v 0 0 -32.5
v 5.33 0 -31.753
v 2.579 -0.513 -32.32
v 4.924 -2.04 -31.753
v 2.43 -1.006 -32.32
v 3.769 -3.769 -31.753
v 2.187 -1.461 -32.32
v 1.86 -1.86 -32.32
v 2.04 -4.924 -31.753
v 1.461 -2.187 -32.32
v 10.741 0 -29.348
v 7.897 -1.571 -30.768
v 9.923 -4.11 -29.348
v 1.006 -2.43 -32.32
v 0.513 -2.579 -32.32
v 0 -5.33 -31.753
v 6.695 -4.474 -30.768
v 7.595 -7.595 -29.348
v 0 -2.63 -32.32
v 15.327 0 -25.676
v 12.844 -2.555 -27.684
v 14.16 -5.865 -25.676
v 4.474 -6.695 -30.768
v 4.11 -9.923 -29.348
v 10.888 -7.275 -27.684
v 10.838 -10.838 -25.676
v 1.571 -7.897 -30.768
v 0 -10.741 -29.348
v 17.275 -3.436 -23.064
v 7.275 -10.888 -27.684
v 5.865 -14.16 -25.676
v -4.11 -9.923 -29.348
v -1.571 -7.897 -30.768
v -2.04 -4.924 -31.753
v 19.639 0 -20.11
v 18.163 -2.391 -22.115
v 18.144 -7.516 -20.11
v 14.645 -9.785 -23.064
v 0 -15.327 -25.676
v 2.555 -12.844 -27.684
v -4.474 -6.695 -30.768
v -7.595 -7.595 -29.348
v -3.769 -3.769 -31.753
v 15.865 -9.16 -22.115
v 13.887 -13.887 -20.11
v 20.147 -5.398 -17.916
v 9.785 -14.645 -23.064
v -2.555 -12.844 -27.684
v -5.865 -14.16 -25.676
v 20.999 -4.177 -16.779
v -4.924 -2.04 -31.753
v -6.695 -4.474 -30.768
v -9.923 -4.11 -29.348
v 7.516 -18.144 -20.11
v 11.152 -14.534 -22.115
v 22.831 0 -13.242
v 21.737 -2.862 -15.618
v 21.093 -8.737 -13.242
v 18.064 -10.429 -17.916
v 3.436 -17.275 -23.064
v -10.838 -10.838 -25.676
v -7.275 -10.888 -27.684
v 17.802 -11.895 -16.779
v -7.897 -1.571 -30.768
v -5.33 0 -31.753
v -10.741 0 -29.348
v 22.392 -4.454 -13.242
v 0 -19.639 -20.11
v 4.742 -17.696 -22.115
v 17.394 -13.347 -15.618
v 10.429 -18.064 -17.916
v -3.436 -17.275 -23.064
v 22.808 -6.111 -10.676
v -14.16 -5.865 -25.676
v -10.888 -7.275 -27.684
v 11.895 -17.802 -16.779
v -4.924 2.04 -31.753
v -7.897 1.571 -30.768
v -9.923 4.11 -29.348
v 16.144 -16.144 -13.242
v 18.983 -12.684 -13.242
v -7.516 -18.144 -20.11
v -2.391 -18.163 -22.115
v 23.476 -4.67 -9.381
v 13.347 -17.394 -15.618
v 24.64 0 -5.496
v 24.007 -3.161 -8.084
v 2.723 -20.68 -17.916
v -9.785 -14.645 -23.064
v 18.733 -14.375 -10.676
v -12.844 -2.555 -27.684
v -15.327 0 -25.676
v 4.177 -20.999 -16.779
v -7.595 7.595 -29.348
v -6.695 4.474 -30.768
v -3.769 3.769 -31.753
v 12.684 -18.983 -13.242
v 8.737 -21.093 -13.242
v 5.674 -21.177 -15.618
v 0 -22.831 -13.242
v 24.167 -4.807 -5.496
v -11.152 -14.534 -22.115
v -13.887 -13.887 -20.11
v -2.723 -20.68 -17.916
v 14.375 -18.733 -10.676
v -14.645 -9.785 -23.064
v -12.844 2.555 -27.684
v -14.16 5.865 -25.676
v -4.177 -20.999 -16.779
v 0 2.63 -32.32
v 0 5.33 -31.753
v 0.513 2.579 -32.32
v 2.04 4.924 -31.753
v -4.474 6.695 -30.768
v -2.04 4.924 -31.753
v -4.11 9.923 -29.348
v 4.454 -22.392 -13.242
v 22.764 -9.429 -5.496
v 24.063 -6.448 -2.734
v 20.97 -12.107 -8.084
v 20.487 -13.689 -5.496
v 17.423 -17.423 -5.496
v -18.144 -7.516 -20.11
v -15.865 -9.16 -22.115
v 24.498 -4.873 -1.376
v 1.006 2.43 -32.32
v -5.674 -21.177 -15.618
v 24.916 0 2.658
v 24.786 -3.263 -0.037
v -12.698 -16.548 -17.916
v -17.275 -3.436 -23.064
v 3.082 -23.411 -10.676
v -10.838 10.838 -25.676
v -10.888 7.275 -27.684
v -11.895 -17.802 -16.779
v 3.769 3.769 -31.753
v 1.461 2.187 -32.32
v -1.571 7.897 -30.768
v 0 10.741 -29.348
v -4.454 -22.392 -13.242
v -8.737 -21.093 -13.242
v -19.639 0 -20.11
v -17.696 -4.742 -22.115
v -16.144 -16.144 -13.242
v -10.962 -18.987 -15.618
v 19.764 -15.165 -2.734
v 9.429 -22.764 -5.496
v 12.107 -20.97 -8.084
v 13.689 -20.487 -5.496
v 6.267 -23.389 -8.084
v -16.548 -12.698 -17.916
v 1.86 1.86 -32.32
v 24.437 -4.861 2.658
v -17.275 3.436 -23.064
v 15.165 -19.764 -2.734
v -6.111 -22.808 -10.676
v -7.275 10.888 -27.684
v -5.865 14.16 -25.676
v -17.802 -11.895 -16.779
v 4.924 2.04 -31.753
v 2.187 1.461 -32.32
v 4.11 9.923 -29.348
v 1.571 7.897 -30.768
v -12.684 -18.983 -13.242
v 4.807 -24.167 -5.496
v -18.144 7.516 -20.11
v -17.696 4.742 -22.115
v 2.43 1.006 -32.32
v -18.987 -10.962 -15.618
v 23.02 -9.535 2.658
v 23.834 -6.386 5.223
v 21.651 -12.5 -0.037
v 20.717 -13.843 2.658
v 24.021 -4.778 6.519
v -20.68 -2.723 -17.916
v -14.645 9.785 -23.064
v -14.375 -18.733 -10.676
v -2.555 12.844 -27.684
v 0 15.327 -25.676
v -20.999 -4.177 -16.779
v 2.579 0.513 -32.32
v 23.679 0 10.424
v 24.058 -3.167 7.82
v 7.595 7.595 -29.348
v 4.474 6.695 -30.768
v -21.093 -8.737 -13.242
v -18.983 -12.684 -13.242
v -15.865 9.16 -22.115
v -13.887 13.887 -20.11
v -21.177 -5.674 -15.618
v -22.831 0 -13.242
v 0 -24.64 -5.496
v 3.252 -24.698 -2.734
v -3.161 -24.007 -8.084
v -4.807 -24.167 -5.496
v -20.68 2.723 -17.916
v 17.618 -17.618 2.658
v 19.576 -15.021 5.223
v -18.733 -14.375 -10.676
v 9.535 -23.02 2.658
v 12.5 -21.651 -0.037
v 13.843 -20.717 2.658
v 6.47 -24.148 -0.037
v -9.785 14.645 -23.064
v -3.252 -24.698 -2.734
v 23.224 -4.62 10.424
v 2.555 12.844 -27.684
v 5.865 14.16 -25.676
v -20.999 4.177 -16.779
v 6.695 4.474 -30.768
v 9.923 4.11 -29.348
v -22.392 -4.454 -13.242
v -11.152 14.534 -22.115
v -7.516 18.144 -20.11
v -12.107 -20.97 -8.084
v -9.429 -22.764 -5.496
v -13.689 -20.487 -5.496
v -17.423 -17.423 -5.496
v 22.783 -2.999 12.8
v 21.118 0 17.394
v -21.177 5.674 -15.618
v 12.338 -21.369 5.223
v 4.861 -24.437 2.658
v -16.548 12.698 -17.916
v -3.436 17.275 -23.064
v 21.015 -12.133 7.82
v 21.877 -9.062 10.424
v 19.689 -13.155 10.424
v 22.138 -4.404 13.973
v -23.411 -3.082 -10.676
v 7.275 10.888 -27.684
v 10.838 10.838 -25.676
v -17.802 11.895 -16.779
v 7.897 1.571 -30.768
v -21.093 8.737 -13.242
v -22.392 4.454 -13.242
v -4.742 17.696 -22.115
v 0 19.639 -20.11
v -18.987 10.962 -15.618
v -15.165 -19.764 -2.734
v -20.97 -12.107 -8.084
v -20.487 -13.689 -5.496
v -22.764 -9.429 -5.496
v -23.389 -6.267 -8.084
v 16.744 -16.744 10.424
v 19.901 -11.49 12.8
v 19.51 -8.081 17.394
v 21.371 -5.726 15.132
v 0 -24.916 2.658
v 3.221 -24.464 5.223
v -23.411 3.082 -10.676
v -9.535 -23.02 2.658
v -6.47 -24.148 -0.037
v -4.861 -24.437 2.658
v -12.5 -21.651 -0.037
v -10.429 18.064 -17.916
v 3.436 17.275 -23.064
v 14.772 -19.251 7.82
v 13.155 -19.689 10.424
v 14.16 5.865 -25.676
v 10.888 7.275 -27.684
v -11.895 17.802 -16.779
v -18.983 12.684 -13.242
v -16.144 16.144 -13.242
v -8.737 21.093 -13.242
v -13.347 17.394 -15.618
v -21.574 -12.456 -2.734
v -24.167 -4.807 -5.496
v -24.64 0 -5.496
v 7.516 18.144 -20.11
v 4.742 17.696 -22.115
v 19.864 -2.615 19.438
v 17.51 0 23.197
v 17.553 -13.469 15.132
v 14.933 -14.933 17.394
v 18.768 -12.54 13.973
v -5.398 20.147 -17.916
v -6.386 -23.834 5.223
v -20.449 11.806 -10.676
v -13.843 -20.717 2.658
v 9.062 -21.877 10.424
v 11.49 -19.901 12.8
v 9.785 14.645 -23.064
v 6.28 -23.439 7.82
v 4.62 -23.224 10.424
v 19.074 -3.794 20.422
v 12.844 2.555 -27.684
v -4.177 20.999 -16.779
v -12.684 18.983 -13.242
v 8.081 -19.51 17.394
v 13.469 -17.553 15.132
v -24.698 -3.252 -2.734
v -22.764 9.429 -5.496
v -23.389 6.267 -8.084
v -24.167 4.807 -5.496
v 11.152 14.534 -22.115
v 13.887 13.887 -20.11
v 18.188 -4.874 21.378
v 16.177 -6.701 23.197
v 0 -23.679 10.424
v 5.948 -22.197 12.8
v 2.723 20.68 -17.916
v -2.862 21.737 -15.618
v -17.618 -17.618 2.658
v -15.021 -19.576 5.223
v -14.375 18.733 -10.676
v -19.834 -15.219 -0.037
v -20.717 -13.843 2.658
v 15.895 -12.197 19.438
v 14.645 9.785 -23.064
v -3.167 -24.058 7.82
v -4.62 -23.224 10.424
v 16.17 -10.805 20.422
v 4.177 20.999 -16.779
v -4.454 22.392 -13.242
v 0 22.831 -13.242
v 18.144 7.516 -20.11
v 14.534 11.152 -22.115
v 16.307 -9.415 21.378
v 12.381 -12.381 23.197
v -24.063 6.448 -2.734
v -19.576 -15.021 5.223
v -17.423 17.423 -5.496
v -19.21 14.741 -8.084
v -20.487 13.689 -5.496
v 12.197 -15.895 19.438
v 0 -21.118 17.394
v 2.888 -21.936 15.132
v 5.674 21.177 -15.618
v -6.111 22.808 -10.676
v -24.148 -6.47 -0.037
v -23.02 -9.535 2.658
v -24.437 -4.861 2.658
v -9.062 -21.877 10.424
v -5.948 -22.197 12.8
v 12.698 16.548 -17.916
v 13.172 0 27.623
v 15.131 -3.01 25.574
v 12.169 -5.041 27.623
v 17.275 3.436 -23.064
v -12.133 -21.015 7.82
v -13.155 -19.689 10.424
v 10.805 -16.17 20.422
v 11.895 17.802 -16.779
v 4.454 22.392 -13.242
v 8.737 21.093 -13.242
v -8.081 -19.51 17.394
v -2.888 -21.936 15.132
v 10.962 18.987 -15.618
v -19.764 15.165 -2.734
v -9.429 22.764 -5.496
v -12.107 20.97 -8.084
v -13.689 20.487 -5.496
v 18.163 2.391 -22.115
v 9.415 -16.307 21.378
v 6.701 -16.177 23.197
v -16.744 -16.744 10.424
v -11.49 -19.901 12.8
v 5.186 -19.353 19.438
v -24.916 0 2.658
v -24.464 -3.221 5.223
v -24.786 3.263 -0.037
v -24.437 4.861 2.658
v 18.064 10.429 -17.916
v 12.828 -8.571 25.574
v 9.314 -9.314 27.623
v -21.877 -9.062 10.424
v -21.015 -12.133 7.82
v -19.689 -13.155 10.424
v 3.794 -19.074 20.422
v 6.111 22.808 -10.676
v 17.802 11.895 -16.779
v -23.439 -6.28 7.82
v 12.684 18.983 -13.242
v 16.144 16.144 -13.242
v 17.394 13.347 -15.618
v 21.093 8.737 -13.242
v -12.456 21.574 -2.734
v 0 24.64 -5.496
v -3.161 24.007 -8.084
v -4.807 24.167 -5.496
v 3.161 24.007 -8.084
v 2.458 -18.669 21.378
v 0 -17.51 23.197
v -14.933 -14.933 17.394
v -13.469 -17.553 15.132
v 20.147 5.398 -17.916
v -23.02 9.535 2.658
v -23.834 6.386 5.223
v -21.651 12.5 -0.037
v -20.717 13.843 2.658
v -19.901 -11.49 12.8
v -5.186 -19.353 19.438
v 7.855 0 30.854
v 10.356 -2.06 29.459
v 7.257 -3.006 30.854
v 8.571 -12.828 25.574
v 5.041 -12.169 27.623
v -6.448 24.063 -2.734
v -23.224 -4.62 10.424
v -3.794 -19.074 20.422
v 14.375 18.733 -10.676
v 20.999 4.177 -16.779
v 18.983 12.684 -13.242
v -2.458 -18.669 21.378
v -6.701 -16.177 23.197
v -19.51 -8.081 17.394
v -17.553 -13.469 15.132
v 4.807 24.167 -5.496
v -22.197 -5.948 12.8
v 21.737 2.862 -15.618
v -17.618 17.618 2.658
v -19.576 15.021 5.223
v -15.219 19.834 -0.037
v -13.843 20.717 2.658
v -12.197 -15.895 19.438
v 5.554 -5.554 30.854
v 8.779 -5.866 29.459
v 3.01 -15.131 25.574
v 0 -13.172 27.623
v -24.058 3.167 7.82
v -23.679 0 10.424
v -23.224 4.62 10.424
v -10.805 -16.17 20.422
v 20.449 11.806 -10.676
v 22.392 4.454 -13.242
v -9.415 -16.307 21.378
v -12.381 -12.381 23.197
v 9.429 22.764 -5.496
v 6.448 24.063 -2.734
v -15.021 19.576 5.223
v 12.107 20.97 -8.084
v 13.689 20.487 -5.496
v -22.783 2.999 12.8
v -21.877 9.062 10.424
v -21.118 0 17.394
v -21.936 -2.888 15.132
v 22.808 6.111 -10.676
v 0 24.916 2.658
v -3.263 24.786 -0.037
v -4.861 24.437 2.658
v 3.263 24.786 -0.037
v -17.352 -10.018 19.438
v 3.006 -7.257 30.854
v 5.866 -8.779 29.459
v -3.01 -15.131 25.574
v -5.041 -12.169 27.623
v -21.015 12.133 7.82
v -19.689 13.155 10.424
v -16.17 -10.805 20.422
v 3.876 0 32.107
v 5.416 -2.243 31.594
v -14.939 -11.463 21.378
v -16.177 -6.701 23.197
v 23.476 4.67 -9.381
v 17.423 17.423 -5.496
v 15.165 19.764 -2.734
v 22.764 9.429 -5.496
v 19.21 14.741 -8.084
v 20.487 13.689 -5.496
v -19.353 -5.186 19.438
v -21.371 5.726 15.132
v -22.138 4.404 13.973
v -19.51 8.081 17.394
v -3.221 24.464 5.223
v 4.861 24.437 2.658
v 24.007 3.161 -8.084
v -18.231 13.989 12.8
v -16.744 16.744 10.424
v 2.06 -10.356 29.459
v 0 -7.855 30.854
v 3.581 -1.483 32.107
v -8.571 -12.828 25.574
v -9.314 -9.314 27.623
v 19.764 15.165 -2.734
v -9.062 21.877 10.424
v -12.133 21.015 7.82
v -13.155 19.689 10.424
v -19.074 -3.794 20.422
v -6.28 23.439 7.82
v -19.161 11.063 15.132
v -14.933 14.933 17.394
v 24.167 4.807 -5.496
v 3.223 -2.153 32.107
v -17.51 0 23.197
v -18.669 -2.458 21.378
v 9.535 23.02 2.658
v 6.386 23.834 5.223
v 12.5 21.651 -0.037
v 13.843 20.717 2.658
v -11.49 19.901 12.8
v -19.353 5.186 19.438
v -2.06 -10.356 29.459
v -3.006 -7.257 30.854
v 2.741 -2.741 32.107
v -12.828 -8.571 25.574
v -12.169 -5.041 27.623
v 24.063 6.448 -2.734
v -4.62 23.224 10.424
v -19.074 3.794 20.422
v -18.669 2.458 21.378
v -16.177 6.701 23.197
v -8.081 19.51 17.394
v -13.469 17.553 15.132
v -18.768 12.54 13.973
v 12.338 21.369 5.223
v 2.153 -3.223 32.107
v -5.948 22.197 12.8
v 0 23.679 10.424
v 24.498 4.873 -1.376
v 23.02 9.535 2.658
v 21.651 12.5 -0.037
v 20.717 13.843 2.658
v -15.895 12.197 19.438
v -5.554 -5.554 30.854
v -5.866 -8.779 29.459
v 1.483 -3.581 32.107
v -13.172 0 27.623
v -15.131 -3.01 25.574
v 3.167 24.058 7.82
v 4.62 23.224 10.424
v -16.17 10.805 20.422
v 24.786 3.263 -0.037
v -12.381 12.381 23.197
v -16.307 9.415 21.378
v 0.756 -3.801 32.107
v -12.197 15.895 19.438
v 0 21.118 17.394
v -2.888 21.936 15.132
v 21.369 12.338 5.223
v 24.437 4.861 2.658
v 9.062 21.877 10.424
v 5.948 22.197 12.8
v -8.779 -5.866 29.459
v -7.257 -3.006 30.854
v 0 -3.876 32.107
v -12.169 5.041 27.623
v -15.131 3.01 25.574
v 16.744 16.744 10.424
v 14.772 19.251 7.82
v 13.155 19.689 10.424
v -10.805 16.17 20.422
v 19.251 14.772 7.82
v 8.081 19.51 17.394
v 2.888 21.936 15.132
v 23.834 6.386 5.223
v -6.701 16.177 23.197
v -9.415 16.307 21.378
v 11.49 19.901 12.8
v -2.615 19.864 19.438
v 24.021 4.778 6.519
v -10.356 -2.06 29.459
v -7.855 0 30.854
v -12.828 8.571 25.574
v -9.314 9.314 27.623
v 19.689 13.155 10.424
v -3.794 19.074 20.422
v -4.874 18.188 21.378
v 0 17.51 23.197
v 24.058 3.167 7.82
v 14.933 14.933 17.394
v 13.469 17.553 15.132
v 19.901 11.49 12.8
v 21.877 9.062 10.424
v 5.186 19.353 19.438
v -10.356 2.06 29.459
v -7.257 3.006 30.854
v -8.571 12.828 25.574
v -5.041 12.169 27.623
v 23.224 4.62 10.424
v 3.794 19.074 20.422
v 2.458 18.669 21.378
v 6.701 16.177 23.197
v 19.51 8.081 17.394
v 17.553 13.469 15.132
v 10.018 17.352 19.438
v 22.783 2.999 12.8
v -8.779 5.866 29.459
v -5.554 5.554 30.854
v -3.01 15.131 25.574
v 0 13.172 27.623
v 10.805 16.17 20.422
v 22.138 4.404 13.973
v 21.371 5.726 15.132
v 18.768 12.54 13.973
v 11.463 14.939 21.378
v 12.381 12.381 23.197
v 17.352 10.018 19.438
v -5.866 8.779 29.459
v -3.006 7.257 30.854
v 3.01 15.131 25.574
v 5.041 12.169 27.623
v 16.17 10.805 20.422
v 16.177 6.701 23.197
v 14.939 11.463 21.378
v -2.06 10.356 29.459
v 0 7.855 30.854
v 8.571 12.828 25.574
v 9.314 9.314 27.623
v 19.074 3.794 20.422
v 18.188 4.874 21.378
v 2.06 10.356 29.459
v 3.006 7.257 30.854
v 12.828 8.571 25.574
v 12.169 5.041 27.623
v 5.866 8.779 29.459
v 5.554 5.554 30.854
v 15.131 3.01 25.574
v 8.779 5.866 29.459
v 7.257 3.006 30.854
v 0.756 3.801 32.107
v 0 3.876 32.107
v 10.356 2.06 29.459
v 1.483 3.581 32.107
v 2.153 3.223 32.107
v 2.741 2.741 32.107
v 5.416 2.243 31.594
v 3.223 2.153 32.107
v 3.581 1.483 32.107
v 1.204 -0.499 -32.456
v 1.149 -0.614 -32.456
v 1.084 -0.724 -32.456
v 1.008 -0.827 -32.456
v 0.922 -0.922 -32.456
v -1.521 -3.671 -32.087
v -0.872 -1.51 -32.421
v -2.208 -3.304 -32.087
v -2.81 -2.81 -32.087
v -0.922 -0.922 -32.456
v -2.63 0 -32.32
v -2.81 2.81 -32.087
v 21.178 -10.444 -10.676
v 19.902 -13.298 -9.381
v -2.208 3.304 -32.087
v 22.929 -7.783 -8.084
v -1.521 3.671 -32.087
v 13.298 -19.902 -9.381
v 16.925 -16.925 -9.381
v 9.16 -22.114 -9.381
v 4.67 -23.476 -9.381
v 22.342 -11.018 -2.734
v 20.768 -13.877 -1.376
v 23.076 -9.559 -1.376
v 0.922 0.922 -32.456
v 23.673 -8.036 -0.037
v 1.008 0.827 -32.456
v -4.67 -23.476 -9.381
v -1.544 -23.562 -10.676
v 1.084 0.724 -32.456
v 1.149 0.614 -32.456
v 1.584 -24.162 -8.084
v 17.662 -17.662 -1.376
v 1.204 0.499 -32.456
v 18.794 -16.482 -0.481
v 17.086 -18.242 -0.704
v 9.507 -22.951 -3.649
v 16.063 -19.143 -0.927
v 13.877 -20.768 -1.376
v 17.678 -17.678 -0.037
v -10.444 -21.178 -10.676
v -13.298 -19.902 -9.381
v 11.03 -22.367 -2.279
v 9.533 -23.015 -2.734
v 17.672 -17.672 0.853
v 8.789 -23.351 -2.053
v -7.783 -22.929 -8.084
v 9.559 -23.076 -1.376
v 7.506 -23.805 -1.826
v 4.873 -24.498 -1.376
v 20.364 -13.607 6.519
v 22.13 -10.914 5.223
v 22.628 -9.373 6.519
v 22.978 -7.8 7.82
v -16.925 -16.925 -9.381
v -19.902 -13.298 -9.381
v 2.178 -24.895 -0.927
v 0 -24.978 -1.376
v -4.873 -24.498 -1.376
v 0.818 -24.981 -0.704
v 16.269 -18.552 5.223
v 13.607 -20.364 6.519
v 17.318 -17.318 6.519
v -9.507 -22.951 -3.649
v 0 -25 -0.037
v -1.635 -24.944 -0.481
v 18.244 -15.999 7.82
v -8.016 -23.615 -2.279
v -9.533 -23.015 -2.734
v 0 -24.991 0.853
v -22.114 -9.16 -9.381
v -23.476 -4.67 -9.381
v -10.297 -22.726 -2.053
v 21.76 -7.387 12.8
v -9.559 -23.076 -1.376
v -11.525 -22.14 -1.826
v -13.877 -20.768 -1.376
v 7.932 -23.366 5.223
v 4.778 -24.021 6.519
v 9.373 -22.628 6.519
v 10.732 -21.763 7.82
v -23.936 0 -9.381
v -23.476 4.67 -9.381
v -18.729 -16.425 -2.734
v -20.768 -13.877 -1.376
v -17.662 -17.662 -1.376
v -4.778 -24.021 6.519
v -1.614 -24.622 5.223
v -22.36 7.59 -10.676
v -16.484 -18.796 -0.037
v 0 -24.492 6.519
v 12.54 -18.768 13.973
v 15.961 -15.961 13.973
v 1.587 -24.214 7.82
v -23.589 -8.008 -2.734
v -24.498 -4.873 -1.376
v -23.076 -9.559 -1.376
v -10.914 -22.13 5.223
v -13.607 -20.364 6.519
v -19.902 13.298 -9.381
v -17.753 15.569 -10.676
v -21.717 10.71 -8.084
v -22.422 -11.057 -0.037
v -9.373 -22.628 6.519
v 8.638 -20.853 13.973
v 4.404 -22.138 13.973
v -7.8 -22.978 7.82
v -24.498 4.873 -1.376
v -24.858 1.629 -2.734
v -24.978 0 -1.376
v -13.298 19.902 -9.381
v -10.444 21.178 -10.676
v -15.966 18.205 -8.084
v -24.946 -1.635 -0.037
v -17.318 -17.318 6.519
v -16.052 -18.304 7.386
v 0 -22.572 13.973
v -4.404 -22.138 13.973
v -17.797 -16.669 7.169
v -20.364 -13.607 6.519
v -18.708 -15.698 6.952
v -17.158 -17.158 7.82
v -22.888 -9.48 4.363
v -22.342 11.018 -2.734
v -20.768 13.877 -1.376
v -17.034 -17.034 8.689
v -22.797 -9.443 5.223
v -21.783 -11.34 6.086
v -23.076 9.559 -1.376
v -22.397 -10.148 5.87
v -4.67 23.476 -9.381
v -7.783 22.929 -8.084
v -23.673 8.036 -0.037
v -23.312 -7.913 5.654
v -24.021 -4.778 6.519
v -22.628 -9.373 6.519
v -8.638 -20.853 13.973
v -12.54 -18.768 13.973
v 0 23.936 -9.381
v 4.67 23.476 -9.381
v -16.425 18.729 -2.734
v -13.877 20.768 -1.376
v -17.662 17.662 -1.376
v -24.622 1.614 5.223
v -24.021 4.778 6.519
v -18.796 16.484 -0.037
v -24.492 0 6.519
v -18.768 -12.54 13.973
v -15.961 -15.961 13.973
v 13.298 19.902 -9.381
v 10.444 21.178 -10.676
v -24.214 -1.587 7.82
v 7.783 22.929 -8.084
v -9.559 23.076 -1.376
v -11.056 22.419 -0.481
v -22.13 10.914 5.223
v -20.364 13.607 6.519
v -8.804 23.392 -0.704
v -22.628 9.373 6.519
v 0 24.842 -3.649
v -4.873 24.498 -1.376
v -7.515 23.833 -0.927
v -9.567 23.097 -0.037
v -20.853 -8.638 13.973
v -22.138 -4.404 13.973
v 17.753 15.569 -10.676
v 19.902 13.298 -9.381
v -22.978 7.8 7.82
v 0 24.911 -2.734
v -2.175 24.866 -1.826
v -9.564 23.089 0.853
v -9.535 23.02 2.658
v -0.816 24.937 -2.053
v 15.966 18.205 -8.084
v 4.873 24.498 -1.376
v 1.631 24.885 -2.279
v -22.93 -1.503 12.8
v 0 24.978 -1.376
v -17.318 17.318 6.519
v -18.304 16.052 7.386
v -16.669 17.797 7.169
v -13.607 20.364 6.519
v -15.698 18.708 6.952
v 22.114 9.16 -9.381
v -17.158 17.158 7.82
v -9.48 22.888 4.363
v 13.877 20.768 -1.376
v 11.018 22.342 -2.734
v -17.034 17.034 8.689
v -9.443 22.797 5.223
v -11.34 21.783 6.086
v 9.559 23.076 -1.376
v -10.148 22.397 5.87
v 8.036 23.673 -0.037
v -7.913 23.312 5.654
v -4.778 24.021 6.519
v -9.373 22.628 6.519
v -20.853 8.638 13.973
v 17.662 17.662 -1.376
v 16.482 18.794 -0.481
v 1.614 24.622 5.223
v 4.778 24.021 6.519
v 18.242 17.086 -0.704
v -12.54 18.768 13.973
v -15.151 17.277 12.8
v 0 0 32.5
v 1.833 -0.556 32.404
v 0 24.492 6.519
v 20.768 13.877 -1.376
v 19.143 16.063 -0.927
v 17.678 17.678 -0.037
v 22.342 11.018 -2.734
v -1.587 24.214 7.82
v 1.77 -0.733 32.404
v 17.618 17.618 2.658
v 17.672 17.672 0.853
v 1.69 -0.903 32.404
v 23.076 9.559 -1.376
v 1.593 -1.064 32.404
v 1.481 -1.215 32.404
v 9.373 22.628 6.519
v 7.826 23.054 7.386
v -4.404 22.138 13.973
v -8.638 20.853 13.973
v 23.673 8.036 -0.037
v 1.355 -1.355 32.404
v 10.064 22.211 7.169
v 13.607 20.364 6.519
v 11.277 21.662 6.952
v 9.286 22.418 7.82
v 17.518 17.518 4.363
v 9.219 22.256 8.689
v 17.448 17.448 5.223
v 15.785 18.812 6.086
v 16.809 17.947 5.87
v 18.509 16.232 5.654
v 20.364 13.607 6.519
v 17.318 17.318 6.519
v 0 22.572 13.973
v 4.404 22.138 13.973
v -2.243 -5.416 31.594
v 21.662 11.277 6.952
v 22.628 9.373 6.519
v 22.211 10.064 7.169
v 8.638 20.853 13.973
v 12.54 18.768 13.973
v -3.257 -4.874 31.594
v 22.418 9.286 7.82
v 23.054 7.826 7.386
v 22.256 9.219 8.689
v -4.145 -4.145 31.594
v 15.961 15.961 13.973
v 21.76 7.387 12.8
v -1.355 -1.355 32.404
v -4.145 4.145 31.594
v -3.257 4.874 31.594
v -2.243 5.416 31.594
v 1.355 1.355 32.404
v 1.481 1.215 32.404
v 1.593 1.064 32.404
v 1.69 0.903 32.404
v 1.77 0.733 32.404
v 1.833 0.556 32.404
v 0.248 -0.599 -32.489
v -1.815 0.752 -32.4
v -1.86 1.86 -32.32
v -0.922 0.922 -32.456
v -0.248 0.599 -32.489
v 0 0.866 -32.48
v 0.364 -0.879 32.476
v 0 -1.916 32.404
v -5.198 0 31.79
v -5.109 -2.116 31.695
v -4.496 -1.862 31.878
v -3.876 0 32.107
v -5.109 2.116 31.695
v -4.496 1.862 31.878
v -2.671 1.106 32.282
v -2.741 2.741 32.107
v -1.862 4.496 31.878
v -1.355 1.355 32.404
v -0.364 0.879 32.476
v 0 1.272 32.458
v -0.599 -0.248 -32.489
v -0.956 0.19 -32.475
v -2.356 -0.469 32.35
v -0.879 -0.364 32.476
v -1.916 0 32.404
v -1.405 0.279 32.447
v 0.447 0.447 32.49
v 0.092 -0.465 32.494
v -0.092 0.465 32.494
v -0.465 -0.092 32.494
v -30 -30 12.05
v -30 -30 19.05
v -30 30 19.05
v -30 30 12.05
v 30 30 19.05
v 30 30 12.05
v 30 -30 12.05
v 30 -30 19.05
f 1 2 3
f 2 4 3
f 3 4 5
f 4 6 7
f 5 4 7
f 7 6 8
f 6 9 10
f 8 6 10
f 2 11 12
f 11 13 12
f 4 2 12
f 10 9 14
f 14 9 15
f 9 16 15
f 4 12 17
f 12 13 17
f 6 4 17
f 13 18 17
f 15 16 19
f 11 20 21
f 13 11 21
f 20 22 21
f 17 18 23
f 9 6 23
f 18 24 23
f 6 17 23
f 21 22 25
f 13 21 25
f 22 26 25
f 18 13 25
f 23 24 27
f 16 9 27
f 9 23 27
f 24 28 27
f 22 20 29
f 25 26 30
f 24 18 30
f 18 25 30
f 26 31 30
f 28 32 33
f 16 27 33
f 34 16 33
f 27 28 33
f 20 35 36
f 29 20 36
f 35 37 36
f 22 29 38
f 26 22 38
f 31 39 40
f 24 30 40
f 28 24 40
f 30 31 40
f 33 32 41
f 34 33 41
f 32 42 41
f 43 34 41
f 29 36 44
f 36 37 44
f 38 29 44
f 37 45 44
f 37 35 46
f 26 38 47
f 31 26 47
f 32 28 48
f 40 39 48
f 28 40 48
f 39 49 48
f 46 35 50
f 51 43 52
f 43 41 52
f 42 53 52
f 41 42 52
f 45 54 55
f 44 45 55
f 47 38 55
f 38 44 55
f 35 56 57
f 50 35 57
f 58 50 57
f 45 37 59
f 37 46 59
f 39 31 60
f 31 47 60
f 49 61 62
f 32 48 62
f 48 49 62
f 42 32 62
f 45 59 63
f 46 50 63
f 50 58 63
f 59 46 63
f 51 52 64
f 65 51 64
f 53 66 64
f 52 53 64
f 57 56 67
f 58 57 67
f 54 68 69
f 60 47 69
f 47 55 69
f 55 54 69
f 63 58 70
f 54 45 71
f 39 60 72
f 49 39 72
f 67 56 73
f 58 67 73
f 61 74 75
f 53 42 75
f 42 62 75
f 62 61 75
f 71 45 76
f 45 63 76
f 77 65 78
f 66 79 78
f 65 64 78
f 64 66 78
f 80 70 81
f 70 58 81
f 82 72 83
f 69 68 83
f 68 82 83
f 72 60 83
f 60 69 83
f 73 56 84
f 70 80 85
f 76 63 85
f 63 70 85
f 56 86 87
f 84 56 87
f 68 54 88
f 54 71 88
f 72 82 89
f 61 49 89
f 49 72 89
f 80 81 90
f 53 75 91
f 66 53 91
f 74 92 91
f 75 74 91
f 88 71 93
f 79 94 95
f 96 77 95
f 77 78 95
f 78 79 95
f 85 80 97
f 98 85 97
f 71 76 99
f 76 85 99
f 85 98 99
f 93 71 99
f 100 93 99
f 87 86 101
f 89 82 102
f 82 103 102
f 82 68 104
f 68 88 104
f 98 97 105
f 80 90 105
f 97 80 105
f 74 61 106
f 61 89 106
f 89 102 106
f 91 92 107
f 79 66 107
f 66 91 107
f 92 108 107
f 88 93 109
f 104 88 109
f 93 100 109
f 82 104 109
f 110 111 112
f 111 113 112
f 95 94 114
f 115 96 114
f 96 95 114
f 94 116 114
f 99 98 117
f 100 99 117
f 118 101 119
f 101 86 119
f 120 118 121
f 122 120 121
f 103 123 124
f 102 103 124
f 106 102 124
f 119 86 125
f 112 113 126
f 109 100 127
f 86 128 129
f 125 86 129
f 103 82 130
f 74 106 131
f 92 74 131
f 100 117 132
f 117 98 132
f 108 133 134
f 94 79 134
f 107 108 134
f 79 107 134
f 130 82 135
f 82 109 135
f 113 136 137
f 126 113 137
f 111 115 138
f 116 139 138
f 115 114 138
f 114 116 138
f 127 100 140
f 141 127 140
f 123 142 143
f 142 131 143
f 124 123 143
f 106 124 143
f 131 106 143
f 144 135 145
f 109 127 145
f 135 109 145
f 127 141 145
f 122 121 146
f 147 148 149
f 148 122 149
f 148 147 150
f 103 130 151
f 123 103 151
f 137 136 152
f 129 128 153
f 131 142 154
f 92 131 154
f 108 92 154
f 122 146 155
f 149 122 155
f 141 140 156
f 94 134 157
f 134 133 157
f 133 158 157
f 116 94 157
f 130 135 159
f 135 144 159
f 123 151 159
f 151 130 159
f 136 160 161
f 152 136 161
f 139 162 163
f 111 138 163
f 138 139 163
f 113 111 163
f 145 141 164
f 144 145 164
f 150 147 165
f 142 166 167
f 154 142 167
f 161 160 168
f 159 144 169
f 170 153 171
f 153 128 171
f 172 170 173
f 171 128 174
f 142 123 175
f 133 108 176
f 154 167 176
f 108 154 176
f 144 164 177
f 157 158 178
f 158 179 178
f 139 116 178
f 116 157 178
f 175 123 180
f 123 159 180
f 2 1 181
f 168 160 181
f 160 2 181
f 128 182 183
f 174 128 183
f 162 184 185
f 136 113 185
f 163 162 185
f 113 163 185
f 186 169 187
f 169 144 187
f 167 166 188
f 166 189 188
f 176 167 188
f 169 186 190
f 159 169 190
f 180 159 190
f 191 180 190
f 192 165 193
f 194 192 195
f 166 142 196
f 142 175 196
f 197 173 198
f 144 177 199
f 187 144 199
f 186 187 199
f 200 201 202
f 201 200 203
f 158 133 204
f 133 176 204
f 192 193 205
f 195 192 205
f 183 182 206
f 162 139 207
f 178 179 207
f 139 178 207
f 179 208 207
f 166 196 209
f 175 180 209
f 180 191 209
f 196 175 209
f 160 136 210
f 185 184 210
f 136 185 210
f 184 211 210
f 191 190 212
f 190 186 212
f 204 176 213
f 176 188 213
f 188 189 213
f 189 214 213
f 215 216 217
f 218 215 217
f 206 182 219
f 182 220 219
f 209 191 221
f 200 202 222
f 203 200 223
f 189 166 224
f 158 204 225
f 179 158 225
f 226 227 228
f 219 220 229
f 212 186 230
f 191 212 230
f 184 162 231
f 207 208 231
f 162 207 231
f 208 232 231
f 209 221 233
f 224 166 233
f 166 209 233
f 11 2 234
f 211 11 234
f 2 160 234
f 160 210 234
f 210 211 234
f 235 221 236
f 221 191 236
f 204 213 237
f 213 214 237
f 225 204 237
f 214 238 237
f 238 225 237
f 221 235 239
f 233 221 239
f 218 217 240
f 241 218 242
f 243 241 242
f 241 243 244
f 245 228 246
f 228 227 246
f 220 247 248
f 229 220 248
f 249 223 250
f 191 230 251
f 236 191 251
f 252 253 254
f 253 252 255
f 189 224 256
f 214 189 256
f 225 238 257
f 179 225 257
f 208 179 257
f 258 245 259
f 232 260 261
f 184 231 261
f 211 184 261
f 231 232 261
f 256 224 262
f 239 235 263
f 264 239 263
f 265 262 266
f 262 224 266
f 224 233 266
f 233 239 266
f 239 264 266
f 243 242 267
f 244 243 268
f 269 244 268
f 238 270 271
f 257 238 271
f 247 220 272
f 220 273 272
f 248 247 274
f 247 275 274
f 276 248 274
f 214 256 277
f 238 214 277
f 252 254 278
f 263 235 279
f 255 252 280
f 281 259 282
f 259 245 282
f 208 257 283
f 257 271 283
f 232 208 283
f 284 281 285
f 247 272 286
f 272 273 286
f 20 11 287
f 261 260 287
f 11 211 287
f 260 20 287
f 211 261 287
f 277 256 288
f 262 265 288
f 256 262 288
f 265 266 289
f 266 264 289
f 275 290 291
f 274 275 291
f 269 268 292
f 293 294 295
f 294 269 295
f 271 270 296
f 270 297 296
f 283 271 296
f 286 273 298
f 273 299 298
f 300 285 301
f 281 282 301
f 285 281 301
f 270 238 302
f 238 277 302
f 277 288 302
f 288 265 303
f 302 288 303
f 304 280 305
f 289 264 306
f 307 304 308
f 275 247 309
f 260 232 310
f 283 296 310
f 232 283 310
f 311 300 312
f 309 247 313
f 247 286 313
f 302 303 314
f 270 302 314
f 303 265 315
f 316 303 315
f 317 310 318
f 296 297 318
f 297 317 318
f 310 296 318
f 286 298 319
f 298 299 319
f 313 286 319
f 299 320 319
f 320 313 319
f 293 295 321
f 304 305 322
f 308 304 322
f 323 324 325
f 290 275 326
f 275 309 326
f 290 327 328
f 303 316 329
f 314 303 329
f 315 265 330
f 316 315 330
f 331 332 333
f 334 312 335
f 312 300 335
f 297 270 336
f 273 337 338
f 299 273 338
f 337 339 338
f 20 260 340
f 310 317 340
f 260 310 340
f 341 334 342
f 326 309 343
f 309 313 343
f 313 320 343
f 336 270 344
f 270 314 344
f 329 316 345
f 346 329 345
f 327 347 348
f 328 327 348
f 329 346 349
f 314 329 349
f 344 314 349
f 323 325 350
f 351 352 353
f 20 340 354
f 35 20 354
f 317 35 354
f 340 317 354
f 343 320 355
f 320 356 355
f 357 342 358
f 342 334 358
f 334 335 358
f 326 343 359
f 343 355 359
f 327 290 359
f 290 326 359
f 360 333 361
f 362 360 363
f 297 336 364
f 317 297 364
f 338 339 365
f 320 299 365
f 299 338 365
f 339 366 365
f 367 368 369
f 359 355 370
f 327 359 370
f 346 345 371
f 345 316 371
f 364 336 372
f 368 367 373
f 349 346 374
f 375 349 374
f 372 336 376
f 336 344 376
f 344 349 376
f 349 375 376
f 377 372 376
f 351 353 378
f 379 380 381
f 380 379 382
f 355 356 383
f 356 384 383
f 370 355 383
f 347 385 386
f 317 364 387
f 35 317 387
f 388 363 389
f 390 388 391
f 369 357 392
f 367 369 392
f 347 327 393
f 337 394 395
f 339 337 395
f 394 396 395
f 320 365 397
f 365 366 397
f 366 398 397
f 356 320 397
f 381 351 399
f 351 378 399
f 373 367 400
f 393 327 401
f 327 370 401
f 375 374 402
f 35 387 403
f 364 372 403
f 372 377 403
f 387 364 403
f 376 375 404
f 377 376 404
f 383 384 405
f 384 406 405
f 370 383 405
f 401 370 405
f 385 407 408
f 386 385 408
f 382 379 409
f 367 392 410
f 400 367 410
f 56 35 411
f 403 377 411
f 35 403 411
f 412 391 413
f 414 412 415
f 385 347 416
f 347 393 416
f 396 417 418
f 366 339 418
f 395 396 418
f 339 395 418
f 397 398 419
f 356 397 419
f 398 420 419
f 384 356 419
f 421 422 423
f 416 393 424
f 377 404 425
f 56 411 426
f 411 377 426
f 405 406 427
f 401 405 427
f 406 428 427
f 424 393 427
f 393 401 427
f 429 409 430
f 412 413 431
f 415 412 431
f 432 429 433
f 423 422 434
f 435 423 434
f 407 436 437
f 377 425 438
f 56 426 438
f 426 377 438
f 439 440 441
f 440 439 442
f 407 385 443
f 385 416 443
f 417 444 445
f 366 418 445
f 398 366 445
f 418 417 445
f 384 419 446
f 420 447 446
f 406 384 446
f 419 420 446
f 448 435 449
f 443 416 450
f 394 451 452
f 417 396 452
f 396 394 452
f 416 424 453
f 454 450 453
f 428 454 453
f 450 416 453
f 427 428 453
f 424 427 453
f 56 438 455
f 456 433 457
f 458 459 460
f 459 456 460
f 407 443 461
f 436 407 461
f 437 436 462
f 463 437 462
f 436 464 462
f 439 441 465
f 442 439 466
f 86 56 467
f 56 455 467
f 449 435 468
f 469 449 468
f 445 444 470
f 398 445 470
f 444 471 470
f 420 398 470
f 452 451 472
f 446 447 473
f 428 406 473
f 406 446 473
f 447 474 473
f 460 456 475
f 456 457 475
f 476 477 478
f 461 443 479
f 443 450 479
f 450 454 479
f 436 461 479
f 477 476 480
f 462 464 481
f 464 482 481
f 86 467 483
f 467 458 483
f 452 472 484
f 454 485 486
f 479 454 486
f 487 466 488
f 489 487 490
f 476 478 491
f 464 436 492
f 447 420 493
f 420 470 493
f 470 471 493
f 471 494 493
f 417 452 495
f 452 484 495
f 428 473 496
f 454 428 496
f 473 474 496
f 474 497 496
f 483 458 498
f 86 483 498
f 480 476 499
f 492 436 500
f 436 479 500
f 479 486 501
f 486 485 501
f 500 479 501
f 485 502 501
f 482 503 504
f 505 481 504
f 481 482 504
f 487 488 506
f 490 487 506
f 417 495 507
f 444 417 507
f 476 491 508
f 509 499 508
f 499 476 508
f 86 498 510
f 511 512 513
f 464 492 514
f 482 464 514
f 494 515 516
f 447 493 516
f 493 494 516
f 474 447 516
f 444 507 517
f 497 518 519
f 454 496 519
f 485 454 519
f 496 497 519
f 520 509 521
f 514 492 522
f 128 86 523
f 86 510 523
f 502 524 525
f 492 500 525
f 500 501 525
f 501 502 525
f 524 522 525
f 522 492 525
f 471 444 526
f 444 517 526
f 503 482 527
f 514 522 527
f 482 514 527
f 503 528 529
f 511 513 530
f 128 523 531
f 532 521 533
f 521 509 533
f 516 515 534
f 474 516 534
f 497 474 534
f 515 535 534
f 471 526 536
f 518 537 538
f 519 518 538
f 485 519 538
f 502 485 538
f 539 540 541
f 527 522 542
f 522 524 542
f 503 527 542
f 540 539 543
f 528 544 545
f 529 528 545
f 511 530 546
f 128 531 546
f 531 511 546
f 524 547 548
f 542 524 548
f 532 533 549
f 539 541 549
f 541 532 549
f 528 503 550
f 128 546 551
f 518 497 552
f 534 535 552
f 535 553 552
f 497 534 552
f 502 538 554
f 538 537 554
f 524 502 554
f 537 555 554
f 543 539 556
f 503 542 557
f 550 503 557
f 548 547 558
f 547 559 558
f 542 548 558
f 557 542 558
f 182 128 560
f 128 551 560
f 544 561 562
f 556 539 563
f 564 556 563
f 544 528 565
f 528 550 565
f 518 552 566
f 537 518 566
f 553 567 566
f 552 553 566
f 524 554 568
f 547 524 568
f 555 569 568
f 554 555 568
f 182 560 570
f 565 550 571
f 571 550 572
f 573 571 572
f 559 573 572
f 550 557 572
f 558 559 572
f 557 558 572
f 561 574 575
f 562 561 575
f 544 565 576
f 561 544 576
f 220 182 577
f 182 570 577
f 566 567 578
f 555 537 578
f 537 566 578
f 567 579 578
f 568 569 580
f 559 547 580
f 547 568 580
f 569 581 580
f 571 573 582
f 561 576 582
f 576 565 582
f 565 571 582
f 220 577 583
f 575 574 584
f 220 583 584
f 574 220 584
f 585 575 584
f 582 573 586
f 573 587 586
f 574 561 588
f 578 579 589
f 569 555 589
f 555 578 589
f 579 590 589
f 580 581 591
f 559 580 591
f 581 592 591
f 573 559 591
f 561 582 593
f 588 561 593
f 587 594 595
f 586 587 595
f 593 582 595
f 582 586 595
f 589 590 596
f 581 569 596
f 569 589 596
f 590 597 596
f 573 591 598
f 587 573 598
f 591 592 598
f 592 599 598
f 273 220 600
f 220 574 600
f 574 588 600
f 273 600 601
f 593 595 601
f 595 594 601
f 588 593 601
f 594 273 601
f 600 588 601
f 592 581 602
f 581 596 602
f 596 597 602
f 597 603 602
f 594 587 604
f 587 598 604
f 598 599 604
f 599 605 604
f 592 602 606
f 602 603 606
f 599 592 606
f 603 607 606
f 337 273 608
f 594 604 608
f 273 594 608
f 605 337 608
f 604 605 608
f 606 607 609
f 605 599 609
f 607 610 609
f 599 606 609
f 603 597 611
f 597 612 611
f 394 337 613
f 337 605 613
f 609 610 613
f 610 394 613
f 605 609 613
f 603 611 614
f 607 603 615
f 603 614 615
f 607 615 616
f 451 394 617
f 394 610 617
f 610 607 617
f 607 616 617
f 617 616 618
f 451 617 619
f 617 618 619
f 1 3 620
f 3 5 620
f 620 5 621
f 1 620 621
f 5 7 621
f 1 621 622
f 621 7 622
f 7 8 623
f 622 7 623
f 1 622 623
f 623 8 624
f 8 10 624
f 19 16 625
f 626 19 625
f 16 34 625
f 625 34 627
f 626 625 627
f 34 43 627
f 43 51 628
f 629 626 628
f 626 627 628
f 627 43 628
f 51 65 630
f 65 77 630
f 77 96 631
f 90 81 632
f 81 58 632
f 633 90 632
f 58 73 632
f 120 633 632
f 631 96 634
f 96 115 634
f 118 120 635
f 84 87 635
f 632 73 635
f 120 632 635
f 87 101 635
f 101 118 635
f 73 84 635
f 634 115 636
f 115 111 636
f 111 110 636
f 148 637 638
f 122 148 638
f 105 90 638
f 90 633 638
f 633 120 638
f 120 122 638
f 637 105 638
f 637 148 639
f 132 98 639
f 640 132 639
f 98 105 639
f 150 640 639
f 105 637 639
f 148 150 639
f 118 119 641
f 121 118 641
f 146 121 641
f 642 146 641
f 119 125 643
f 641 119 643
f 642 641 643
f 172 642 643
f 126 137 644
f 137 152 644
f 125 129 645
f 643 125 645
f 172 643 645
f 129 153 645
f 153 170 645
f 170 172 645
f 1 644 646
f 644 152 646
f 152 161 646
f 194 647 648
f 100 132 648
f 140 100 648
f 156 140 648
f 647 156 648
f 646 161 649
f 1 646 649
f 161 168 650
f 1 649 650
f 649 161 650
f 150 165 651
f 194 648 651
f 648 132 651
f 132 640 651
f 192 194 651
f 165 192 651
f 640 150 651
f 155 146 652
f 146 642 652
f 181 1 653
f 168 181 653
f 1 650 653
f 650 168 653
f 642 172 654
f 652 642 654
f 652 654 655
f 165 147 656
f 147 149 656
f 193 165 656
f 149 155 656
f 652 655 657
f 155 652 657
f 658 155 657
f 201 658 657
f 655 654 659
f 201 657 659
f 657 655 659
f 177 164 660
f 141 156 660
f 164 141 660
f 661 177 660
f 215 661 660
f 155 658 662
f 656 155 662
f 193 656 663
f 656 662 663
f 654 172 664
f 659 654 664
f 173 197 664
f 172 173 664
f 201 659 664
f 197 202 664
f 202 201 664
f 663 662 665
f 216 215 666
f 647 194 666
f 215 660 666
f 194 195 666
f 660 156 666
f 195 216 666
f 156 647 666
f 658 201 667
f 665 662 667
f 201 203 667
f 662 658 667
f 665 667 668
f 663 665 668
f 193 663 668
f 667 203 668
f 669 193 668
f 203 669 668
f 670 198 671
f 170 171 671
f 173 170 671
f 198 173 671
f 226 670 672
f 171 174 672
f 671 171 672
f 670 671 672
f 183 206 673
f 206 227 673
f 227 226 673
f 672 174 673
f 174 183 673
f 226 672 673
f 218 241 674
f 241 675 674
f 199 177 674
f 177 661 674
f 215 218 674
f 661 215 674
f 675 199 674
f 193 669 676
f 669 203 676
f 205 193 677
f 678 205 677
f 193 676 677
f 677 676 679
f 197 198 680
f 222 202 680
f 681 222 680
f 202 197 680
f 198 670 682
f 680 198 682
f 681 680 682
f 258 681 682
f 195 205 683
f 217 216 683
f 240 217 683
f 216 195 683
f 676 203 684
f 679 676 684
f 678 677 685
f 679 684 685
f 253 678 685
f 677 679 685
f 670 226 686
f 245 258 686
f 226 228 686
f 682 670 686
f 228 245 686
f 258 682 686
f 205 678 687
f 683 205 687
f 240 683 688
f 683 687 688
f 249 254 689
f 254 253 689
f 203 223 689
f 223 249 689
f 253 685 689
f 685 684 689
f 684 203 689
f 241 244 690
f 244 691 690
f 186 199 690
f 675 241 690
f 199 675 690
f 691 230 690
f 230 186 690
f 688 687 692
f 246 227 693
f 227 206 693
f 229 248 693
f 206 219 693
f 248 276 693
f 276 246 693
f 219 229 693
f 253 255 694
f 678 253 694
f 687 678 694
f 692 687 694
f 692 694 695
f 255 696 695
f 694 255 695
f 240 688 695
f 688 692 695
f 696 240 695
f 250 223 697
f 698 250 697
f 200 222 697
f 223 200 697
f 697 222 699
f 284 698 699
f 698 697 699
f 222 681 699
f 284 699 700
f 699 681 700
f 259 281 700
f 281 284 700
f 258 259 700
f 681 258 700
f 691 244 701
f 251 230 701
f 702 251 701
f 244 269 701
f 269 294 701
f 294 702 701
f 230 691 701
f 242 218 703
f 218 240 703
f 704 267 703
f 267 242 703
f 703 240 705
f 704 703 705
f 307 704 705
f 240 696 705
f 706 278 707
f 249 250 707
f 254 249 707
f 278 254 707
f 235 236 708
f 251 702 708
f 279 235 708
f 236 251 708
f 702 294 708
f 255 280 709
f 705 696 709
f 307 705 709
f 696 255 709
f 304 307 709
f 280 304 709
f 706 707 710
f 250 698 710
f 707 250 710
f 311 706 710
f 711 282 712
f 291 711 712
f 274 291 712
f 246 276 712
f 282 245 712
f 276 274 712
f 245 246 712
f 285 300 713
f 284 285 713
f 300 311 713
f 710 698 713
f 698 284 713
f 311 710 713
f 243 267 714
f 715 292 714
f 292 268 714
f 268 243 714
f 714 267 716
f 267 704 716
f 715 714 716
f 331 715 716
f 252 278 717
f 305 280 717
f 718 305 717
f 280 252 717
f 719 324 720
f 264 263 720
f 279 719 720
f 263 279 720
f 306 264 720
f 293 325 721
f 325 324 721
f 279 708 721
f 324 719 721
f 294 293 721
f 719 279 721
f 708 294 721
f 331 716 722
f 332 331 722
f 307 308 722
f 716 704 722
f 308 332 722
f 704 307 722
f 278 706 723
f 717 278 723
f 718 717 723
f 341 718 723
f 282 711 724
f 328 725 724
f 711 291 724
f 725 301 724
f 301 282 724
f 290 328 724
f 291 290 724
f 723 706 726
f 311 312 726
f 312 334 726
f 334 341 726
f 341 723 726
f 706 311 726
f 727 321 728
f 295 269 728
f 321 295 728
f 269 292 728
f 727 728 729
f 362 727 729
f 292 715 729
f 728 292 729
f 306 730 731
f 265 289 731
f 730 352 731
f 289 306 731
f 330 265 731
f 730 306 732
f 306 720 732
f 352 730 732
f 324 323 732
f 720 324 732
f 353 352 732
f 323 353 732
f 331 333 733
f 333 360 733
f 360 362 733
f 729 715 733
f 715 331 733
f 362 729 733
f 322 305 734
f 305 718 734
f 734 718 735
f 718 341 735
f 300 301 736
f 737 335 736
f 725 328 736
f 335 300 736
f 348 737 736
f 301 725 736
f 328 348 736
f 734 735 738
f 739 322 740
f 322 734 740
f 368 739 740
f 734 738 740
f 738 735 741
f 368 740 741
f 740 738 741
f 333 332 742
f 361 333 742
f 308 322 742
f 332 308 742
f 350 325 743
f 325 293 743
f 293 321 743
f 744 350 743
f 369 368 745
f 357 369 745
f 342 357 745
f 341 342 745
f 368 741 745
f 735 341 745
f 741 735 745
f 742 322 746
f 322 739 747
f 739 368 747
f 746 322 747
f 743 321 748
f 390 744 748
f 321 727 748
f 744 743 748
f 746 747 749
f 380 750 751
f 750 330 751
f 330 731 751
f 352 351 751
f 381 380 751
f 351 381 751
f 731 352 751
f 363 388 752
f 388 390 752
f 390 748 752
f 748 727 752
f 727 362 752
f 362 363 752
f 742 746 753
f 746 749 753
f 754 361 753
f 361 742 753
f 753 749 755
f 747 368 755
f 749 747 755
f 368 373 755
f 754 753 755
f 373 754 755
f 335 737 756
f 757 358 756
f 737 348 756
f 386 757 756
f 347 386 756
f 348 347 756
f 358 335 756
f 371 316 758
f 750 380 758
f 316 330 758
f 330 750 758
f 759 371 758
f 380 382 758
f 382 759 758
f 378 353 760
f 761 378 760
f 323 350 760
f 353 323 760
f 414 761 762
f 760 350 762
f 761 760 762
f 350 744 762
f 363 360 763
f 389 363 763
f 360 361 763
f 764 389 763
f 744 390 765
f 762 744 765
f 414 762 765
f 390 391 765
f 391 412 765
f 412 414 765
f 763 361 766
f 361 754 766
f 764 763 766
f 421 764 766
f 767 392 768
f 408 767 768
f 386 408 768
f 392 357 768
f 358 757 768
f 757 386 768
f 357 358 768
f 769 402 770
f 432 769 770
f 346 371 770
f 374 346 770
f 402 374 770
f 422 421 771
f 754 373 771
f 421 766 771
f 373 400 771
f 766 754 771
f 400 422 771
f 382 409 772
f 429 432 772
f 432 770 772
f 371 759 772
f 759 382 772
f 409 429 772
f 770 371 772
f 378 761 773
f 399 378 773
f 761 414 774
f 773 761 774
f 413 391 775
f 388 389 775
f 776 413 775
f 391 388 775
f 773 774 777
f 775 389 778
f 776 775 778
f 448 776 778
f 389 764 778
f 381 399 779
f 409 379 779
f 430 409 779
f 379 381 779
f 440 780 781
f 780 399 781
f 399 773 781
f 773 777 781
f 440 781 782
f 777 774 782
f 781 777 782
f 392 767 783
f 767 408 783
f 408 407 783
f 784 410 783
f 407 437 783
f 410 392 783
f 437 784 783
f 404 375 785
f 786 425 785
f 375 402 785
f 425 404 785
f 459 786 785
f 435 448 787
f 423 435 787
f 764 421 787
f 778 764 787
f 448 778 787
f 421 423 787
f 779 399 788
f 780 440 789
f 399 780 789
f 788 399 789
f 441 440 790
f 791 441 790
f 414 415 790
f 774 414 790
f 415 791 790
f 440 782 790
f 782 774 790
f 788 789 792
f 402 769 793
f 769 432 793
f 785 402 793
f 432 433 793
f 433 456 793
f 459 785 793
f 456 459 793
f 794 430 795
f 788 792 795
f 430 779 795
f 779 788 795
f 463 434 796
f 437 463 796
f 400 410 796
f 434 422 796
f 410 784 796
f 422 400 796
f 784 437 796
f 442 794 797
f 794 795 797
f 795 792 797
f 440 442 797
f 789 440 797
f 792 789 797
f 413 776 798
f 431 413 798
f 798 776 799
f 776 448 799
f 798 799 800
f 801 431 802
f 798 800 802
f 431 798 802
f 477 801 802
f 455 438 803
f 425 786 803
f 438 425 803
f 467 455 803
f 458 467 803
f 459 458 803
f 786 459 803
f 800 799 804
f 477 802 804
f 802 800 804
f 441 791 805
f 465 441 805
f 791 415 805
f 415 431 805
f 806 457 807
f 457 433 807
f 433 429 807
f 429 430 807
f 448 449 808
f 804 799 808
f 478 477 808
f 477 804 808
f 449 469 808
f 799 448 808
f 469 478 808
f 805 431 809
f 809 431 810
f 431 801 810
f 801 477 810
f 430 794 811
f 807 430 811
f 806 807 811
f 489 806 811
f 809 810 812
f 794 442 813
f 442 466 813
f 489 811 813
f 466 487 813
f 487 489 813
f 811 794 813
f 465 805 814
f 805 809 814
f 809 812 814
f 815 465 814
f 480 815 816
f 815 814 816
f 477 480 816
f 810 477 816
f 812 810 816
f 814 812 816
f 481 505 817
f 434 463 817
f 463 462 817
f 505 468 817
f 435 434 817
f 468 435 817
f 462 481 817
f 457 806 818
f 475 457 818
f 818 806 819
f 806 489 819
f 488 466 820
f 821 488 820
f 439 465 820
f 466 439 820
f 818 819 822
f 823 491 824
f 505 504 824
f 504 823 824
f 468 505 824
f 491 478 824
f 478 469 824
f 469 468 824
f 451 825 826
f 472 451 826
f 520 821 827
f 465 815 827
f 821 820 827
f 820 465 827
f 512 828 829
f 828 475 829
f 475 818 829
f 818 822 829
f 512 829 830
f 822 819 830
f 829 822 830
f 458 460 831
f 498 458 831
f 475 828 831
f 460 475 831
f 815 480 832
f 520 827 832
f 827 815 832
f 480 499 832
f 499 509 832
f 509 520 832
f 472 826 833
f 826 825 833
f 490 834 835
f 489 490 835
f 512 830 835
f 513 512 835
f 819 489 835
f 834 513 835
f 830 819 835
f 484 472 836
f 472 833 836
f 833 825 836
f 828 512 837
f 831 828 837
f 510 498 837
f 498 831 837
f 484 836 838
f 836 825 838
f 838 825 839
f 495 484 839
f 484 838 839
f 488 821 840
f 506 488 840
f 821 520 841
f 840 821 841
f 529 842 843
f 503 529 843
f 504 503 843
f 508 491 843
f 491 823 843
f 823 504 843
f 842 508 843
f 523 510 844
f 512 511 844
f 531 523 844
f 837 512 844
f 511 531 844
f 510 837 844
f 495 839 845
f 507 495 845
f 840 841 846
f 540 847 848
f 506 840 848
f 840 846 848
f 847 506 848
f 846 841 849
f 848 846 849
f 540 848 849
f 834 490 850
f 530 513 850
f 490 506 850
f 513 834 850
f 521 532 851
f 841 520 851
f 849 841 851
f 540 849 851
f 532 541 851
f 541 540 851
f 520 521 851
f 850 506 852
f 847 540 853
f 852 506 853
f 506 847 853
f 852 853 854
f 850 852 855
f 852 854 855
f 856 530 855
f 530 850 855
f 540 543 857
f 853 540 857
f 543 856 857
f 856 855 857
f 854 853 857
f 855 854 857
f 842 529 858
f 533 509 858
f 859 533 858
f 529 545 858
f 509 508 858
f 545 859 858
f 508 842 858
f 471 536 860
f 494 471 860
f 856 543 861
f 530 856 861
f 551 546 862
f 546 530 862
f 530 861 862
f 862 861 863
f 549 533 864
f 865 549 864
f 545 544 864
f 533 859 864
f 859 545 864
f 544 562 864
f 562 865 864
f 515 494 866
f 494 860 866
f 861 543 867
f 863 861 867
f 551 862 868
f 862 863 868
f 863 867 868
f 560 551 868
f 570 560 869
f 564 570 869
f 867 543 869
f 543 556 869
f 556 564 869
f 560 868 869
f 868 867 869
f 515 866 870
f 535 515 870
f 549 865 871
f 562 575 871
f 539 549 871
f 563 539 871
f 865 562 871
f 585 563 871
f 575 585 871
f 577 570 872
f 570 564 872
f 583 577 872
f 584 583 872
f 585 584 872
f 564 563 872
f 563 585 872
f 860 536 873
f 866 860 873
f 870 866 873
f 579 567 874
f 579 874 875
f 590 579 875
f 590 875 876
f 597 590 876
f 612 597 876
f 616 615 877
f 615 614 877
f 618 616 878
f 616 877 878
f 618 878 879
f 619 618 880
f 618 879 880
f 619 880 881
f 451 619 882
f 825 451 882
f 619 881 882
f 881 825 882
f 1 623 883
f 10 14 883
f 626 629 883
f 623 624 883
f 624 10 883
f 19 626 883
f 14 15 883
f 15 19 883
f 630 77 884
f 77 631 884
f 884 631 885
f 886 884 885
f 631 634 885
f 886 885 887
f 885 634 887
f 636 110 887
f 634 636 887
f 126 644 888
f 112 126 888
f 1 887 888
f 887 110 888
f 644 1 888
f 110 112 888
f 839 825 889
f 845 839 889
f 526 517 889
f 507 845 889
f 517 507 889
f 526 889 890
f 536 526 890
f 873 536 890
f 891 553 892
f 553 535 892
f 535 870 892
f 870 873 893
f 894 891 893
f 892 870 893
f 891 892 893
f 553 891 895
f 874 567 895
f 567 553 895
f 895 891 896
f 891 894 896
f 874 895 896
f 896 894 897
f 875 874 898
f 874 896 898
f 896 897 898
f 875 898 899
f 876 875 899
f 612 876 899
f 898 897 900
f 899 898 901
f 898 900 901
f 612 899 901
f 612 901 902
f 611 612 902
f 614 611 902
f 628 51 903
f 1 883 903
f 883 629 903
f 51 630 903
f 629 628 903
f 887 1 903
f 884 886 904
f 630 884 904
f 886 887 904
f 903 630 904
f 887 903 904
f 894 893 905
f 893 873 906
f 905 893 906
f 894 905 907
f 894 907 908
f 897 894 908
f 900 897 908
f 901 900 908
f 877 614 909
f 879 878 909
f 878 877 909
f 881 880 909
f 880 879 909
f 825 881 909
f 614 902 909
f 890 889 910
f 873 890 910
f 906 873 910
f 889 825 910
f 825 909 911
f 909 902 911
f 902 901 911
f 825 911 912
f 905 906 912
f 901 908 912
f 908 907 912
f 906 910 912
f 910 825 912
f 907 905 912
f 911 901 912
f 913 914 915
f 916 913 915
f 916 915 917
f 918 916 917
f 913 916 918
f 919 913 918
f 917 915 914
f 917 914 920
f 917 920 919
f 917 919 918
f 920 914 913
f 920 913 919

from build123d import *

# Parameters (mm, degrees)
F3_W     = 60
F3_H     = 60
F4_DEPTH = 7


with BuildPart() as f1:
    # F0 (on Front) → F1 (revolve)
    with BuildSketch(Plane.XZ):
        with BuildLine():
            Line((0, 0), (0, -32.5))
            add(Edge.make_bspline(
                [(0, -32.5), (25, -32.5), (25, 0)],
                knots=[0, 0, 0, 1.5707963268, 1.5707963268, 1.5707963268], degree=2, weights=[1, 0.7071067812, 1]))
            Line((25, 0), (0, 0))
        make_face()
        with BuildLine():
            Line((0, 0), (25, 0))
            add(Edge.make_bspline(
                [(25, 0), (25, 32.5), (0, 32.5)],
                knots=[1.5707963268, 1.5707963268, 1.5707963268, 3.1415926536, 3.1415926536, 3.1415926536], degree=2, weights=[1, 0.7071067812, 1]))
            Line((0, 32.5), (0, 0))
        make_face()
    revolve(axis=Axis((0, 0, 0), (0, 0, -1)))


with BuildPart() as f4:
    # F3 (on offset) → F4 (new body)
    with BuildSketch(Plane.XY.offset(19.05)):
        Rectangle(F3_W, F3_H)
    extrude(amount=-F4_DEPTH)


solid = Compound([f1.part, f4.part])
